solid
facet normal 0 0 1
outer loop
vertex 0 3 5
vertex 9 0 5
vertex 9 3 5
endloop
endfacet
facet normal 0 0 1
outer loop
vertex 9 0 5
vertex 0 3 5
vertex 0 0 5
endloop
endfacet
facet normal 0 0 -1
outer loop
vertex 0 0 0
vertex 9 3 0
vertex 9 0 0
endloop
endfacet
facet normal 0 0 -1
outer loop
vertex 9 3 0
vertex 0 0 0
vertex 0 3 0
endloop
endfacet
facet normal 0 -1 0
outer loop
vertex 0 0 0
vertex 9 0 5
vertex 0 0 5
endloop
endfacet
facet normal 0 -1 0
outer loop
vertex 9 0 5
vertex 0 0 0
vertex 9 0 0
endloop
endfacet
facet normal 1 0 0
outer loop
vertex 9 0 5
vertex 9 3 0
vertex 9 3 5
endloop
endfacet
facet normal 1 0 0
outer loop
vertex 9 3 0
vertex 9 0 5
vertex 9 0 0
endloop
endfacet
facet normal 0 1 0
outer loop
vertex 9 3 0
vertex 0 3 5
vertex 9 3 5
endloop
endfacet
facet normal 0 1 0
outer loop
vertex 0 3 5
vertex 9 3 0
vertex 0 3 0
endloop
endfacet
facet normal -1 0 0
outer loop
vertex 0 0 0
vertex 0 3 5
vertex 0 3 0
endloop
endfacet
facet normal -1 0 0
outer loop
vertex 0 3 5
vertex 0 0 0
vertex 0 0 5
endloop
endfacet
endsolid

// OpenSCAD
// Generated by SolidPython 1.0.1 on 2020-07-29 00:46:55


cube(size = [9, 3, 5]);
/***********************************************
*********      SolidPython code:      **********
************************************************
 
# import packages: SolidPython
from solid import *
from solid.utils import *
from itertools import chain, combinations, permutations


class Resize:

    def __init__(self, scad_file):
        self.scad_file = scad_file
        #self.scad_file = import_scad(scad_file)
        # cone/cylinder param:
        self.r1 = 0
        self.r2 = 0
        self.h = 0
        # rectangular prism param:
        self.w = 0
        self.l = 0
        # ellipse param:
        self.r = 0

    # import OpenScad code (file name corresponds to shape)


    # classify shape + parameters
    def assign(self, param1, param2, param3):
        if self.scad_file == 'cone.scad':
            self.r1 = param1
            self.r2 = param2
            self.h = param3
        elif self.scad_file == 'cylinder.scad':
            self.r1 = param1
            self.r2 = param2
            self.h = param3
        elif self.scad_file == 'rectangularPrism.scad':
            self.h = param1
            self.l = param2
            self.w = param3
        else:
            self.r = param1
            self.h = param2

    # resize parameters
    def iterate(self):
        x = range(3, 20, 2)
        i = 1
        if self.scad_file == 'cone.scad':
            tempList = list(permutations(x, 2))
            for temp in tempList:
                param1 = temp[0]
                param2 = temp[1]
                filepath = 'produced_scad_files/' + 'cone' + str(param1) + '_' + str(param2) + '_' + '.scad'
                scad_render_to_file(cylinder(h=param1, r1=param2, r2=0), filepath)

        elif self.scad_file == 'cylinder.scad':
            tempList = list(permutations(x, 3))
            for temp in tempList:
                param1 = temp[0]
                param2 = temp[1]
                filepath = 'produced_scad_files/' + 'cylinder' + str(param1) + '_' + str(param2) + '_' + '.scad'
                scad_render_to_file(cylinder(h=param1, r1=param2, r2=param2), filepath)

        elif self.scad_file == 'rectangularPrism.scad':
            tempList = list(permutations(x, 3))
            for temp in tempList:
                param1 = temp[0]
                param2 = temp[1]
                param3 = temp[2]
                filepath = 'produced_scad_files/' + 'rectangularPrism' + str(param1) + '_' + str(param2) + '_' + str(
                    param3) + '.scad'
                scad_render_to_file(cube(size=(param1, param2, param3)), filepath)

        elif self.scad_file == 'ellipse.scad':
            tempList = list(permutations(x, 4))
            for temp in tempList:
                param1 = temp[0]
                param2 = temp[1]
                param3 = temp[2]
                param4 = temp[3]
                filepath = 'produced_scad_files/' + 'ellipse' + str(param1) + '_' + str(param2) + '_' + str(param3) + '_' + str(param4) + '.scad'
                scad_render_to_file(scale([param1, param2, param3])(sphere(r=param4)), filepath)

    def render_to_scadfile(self):
        scad_render_to_file(scad, 'example.scad') 
 
************************************************/
